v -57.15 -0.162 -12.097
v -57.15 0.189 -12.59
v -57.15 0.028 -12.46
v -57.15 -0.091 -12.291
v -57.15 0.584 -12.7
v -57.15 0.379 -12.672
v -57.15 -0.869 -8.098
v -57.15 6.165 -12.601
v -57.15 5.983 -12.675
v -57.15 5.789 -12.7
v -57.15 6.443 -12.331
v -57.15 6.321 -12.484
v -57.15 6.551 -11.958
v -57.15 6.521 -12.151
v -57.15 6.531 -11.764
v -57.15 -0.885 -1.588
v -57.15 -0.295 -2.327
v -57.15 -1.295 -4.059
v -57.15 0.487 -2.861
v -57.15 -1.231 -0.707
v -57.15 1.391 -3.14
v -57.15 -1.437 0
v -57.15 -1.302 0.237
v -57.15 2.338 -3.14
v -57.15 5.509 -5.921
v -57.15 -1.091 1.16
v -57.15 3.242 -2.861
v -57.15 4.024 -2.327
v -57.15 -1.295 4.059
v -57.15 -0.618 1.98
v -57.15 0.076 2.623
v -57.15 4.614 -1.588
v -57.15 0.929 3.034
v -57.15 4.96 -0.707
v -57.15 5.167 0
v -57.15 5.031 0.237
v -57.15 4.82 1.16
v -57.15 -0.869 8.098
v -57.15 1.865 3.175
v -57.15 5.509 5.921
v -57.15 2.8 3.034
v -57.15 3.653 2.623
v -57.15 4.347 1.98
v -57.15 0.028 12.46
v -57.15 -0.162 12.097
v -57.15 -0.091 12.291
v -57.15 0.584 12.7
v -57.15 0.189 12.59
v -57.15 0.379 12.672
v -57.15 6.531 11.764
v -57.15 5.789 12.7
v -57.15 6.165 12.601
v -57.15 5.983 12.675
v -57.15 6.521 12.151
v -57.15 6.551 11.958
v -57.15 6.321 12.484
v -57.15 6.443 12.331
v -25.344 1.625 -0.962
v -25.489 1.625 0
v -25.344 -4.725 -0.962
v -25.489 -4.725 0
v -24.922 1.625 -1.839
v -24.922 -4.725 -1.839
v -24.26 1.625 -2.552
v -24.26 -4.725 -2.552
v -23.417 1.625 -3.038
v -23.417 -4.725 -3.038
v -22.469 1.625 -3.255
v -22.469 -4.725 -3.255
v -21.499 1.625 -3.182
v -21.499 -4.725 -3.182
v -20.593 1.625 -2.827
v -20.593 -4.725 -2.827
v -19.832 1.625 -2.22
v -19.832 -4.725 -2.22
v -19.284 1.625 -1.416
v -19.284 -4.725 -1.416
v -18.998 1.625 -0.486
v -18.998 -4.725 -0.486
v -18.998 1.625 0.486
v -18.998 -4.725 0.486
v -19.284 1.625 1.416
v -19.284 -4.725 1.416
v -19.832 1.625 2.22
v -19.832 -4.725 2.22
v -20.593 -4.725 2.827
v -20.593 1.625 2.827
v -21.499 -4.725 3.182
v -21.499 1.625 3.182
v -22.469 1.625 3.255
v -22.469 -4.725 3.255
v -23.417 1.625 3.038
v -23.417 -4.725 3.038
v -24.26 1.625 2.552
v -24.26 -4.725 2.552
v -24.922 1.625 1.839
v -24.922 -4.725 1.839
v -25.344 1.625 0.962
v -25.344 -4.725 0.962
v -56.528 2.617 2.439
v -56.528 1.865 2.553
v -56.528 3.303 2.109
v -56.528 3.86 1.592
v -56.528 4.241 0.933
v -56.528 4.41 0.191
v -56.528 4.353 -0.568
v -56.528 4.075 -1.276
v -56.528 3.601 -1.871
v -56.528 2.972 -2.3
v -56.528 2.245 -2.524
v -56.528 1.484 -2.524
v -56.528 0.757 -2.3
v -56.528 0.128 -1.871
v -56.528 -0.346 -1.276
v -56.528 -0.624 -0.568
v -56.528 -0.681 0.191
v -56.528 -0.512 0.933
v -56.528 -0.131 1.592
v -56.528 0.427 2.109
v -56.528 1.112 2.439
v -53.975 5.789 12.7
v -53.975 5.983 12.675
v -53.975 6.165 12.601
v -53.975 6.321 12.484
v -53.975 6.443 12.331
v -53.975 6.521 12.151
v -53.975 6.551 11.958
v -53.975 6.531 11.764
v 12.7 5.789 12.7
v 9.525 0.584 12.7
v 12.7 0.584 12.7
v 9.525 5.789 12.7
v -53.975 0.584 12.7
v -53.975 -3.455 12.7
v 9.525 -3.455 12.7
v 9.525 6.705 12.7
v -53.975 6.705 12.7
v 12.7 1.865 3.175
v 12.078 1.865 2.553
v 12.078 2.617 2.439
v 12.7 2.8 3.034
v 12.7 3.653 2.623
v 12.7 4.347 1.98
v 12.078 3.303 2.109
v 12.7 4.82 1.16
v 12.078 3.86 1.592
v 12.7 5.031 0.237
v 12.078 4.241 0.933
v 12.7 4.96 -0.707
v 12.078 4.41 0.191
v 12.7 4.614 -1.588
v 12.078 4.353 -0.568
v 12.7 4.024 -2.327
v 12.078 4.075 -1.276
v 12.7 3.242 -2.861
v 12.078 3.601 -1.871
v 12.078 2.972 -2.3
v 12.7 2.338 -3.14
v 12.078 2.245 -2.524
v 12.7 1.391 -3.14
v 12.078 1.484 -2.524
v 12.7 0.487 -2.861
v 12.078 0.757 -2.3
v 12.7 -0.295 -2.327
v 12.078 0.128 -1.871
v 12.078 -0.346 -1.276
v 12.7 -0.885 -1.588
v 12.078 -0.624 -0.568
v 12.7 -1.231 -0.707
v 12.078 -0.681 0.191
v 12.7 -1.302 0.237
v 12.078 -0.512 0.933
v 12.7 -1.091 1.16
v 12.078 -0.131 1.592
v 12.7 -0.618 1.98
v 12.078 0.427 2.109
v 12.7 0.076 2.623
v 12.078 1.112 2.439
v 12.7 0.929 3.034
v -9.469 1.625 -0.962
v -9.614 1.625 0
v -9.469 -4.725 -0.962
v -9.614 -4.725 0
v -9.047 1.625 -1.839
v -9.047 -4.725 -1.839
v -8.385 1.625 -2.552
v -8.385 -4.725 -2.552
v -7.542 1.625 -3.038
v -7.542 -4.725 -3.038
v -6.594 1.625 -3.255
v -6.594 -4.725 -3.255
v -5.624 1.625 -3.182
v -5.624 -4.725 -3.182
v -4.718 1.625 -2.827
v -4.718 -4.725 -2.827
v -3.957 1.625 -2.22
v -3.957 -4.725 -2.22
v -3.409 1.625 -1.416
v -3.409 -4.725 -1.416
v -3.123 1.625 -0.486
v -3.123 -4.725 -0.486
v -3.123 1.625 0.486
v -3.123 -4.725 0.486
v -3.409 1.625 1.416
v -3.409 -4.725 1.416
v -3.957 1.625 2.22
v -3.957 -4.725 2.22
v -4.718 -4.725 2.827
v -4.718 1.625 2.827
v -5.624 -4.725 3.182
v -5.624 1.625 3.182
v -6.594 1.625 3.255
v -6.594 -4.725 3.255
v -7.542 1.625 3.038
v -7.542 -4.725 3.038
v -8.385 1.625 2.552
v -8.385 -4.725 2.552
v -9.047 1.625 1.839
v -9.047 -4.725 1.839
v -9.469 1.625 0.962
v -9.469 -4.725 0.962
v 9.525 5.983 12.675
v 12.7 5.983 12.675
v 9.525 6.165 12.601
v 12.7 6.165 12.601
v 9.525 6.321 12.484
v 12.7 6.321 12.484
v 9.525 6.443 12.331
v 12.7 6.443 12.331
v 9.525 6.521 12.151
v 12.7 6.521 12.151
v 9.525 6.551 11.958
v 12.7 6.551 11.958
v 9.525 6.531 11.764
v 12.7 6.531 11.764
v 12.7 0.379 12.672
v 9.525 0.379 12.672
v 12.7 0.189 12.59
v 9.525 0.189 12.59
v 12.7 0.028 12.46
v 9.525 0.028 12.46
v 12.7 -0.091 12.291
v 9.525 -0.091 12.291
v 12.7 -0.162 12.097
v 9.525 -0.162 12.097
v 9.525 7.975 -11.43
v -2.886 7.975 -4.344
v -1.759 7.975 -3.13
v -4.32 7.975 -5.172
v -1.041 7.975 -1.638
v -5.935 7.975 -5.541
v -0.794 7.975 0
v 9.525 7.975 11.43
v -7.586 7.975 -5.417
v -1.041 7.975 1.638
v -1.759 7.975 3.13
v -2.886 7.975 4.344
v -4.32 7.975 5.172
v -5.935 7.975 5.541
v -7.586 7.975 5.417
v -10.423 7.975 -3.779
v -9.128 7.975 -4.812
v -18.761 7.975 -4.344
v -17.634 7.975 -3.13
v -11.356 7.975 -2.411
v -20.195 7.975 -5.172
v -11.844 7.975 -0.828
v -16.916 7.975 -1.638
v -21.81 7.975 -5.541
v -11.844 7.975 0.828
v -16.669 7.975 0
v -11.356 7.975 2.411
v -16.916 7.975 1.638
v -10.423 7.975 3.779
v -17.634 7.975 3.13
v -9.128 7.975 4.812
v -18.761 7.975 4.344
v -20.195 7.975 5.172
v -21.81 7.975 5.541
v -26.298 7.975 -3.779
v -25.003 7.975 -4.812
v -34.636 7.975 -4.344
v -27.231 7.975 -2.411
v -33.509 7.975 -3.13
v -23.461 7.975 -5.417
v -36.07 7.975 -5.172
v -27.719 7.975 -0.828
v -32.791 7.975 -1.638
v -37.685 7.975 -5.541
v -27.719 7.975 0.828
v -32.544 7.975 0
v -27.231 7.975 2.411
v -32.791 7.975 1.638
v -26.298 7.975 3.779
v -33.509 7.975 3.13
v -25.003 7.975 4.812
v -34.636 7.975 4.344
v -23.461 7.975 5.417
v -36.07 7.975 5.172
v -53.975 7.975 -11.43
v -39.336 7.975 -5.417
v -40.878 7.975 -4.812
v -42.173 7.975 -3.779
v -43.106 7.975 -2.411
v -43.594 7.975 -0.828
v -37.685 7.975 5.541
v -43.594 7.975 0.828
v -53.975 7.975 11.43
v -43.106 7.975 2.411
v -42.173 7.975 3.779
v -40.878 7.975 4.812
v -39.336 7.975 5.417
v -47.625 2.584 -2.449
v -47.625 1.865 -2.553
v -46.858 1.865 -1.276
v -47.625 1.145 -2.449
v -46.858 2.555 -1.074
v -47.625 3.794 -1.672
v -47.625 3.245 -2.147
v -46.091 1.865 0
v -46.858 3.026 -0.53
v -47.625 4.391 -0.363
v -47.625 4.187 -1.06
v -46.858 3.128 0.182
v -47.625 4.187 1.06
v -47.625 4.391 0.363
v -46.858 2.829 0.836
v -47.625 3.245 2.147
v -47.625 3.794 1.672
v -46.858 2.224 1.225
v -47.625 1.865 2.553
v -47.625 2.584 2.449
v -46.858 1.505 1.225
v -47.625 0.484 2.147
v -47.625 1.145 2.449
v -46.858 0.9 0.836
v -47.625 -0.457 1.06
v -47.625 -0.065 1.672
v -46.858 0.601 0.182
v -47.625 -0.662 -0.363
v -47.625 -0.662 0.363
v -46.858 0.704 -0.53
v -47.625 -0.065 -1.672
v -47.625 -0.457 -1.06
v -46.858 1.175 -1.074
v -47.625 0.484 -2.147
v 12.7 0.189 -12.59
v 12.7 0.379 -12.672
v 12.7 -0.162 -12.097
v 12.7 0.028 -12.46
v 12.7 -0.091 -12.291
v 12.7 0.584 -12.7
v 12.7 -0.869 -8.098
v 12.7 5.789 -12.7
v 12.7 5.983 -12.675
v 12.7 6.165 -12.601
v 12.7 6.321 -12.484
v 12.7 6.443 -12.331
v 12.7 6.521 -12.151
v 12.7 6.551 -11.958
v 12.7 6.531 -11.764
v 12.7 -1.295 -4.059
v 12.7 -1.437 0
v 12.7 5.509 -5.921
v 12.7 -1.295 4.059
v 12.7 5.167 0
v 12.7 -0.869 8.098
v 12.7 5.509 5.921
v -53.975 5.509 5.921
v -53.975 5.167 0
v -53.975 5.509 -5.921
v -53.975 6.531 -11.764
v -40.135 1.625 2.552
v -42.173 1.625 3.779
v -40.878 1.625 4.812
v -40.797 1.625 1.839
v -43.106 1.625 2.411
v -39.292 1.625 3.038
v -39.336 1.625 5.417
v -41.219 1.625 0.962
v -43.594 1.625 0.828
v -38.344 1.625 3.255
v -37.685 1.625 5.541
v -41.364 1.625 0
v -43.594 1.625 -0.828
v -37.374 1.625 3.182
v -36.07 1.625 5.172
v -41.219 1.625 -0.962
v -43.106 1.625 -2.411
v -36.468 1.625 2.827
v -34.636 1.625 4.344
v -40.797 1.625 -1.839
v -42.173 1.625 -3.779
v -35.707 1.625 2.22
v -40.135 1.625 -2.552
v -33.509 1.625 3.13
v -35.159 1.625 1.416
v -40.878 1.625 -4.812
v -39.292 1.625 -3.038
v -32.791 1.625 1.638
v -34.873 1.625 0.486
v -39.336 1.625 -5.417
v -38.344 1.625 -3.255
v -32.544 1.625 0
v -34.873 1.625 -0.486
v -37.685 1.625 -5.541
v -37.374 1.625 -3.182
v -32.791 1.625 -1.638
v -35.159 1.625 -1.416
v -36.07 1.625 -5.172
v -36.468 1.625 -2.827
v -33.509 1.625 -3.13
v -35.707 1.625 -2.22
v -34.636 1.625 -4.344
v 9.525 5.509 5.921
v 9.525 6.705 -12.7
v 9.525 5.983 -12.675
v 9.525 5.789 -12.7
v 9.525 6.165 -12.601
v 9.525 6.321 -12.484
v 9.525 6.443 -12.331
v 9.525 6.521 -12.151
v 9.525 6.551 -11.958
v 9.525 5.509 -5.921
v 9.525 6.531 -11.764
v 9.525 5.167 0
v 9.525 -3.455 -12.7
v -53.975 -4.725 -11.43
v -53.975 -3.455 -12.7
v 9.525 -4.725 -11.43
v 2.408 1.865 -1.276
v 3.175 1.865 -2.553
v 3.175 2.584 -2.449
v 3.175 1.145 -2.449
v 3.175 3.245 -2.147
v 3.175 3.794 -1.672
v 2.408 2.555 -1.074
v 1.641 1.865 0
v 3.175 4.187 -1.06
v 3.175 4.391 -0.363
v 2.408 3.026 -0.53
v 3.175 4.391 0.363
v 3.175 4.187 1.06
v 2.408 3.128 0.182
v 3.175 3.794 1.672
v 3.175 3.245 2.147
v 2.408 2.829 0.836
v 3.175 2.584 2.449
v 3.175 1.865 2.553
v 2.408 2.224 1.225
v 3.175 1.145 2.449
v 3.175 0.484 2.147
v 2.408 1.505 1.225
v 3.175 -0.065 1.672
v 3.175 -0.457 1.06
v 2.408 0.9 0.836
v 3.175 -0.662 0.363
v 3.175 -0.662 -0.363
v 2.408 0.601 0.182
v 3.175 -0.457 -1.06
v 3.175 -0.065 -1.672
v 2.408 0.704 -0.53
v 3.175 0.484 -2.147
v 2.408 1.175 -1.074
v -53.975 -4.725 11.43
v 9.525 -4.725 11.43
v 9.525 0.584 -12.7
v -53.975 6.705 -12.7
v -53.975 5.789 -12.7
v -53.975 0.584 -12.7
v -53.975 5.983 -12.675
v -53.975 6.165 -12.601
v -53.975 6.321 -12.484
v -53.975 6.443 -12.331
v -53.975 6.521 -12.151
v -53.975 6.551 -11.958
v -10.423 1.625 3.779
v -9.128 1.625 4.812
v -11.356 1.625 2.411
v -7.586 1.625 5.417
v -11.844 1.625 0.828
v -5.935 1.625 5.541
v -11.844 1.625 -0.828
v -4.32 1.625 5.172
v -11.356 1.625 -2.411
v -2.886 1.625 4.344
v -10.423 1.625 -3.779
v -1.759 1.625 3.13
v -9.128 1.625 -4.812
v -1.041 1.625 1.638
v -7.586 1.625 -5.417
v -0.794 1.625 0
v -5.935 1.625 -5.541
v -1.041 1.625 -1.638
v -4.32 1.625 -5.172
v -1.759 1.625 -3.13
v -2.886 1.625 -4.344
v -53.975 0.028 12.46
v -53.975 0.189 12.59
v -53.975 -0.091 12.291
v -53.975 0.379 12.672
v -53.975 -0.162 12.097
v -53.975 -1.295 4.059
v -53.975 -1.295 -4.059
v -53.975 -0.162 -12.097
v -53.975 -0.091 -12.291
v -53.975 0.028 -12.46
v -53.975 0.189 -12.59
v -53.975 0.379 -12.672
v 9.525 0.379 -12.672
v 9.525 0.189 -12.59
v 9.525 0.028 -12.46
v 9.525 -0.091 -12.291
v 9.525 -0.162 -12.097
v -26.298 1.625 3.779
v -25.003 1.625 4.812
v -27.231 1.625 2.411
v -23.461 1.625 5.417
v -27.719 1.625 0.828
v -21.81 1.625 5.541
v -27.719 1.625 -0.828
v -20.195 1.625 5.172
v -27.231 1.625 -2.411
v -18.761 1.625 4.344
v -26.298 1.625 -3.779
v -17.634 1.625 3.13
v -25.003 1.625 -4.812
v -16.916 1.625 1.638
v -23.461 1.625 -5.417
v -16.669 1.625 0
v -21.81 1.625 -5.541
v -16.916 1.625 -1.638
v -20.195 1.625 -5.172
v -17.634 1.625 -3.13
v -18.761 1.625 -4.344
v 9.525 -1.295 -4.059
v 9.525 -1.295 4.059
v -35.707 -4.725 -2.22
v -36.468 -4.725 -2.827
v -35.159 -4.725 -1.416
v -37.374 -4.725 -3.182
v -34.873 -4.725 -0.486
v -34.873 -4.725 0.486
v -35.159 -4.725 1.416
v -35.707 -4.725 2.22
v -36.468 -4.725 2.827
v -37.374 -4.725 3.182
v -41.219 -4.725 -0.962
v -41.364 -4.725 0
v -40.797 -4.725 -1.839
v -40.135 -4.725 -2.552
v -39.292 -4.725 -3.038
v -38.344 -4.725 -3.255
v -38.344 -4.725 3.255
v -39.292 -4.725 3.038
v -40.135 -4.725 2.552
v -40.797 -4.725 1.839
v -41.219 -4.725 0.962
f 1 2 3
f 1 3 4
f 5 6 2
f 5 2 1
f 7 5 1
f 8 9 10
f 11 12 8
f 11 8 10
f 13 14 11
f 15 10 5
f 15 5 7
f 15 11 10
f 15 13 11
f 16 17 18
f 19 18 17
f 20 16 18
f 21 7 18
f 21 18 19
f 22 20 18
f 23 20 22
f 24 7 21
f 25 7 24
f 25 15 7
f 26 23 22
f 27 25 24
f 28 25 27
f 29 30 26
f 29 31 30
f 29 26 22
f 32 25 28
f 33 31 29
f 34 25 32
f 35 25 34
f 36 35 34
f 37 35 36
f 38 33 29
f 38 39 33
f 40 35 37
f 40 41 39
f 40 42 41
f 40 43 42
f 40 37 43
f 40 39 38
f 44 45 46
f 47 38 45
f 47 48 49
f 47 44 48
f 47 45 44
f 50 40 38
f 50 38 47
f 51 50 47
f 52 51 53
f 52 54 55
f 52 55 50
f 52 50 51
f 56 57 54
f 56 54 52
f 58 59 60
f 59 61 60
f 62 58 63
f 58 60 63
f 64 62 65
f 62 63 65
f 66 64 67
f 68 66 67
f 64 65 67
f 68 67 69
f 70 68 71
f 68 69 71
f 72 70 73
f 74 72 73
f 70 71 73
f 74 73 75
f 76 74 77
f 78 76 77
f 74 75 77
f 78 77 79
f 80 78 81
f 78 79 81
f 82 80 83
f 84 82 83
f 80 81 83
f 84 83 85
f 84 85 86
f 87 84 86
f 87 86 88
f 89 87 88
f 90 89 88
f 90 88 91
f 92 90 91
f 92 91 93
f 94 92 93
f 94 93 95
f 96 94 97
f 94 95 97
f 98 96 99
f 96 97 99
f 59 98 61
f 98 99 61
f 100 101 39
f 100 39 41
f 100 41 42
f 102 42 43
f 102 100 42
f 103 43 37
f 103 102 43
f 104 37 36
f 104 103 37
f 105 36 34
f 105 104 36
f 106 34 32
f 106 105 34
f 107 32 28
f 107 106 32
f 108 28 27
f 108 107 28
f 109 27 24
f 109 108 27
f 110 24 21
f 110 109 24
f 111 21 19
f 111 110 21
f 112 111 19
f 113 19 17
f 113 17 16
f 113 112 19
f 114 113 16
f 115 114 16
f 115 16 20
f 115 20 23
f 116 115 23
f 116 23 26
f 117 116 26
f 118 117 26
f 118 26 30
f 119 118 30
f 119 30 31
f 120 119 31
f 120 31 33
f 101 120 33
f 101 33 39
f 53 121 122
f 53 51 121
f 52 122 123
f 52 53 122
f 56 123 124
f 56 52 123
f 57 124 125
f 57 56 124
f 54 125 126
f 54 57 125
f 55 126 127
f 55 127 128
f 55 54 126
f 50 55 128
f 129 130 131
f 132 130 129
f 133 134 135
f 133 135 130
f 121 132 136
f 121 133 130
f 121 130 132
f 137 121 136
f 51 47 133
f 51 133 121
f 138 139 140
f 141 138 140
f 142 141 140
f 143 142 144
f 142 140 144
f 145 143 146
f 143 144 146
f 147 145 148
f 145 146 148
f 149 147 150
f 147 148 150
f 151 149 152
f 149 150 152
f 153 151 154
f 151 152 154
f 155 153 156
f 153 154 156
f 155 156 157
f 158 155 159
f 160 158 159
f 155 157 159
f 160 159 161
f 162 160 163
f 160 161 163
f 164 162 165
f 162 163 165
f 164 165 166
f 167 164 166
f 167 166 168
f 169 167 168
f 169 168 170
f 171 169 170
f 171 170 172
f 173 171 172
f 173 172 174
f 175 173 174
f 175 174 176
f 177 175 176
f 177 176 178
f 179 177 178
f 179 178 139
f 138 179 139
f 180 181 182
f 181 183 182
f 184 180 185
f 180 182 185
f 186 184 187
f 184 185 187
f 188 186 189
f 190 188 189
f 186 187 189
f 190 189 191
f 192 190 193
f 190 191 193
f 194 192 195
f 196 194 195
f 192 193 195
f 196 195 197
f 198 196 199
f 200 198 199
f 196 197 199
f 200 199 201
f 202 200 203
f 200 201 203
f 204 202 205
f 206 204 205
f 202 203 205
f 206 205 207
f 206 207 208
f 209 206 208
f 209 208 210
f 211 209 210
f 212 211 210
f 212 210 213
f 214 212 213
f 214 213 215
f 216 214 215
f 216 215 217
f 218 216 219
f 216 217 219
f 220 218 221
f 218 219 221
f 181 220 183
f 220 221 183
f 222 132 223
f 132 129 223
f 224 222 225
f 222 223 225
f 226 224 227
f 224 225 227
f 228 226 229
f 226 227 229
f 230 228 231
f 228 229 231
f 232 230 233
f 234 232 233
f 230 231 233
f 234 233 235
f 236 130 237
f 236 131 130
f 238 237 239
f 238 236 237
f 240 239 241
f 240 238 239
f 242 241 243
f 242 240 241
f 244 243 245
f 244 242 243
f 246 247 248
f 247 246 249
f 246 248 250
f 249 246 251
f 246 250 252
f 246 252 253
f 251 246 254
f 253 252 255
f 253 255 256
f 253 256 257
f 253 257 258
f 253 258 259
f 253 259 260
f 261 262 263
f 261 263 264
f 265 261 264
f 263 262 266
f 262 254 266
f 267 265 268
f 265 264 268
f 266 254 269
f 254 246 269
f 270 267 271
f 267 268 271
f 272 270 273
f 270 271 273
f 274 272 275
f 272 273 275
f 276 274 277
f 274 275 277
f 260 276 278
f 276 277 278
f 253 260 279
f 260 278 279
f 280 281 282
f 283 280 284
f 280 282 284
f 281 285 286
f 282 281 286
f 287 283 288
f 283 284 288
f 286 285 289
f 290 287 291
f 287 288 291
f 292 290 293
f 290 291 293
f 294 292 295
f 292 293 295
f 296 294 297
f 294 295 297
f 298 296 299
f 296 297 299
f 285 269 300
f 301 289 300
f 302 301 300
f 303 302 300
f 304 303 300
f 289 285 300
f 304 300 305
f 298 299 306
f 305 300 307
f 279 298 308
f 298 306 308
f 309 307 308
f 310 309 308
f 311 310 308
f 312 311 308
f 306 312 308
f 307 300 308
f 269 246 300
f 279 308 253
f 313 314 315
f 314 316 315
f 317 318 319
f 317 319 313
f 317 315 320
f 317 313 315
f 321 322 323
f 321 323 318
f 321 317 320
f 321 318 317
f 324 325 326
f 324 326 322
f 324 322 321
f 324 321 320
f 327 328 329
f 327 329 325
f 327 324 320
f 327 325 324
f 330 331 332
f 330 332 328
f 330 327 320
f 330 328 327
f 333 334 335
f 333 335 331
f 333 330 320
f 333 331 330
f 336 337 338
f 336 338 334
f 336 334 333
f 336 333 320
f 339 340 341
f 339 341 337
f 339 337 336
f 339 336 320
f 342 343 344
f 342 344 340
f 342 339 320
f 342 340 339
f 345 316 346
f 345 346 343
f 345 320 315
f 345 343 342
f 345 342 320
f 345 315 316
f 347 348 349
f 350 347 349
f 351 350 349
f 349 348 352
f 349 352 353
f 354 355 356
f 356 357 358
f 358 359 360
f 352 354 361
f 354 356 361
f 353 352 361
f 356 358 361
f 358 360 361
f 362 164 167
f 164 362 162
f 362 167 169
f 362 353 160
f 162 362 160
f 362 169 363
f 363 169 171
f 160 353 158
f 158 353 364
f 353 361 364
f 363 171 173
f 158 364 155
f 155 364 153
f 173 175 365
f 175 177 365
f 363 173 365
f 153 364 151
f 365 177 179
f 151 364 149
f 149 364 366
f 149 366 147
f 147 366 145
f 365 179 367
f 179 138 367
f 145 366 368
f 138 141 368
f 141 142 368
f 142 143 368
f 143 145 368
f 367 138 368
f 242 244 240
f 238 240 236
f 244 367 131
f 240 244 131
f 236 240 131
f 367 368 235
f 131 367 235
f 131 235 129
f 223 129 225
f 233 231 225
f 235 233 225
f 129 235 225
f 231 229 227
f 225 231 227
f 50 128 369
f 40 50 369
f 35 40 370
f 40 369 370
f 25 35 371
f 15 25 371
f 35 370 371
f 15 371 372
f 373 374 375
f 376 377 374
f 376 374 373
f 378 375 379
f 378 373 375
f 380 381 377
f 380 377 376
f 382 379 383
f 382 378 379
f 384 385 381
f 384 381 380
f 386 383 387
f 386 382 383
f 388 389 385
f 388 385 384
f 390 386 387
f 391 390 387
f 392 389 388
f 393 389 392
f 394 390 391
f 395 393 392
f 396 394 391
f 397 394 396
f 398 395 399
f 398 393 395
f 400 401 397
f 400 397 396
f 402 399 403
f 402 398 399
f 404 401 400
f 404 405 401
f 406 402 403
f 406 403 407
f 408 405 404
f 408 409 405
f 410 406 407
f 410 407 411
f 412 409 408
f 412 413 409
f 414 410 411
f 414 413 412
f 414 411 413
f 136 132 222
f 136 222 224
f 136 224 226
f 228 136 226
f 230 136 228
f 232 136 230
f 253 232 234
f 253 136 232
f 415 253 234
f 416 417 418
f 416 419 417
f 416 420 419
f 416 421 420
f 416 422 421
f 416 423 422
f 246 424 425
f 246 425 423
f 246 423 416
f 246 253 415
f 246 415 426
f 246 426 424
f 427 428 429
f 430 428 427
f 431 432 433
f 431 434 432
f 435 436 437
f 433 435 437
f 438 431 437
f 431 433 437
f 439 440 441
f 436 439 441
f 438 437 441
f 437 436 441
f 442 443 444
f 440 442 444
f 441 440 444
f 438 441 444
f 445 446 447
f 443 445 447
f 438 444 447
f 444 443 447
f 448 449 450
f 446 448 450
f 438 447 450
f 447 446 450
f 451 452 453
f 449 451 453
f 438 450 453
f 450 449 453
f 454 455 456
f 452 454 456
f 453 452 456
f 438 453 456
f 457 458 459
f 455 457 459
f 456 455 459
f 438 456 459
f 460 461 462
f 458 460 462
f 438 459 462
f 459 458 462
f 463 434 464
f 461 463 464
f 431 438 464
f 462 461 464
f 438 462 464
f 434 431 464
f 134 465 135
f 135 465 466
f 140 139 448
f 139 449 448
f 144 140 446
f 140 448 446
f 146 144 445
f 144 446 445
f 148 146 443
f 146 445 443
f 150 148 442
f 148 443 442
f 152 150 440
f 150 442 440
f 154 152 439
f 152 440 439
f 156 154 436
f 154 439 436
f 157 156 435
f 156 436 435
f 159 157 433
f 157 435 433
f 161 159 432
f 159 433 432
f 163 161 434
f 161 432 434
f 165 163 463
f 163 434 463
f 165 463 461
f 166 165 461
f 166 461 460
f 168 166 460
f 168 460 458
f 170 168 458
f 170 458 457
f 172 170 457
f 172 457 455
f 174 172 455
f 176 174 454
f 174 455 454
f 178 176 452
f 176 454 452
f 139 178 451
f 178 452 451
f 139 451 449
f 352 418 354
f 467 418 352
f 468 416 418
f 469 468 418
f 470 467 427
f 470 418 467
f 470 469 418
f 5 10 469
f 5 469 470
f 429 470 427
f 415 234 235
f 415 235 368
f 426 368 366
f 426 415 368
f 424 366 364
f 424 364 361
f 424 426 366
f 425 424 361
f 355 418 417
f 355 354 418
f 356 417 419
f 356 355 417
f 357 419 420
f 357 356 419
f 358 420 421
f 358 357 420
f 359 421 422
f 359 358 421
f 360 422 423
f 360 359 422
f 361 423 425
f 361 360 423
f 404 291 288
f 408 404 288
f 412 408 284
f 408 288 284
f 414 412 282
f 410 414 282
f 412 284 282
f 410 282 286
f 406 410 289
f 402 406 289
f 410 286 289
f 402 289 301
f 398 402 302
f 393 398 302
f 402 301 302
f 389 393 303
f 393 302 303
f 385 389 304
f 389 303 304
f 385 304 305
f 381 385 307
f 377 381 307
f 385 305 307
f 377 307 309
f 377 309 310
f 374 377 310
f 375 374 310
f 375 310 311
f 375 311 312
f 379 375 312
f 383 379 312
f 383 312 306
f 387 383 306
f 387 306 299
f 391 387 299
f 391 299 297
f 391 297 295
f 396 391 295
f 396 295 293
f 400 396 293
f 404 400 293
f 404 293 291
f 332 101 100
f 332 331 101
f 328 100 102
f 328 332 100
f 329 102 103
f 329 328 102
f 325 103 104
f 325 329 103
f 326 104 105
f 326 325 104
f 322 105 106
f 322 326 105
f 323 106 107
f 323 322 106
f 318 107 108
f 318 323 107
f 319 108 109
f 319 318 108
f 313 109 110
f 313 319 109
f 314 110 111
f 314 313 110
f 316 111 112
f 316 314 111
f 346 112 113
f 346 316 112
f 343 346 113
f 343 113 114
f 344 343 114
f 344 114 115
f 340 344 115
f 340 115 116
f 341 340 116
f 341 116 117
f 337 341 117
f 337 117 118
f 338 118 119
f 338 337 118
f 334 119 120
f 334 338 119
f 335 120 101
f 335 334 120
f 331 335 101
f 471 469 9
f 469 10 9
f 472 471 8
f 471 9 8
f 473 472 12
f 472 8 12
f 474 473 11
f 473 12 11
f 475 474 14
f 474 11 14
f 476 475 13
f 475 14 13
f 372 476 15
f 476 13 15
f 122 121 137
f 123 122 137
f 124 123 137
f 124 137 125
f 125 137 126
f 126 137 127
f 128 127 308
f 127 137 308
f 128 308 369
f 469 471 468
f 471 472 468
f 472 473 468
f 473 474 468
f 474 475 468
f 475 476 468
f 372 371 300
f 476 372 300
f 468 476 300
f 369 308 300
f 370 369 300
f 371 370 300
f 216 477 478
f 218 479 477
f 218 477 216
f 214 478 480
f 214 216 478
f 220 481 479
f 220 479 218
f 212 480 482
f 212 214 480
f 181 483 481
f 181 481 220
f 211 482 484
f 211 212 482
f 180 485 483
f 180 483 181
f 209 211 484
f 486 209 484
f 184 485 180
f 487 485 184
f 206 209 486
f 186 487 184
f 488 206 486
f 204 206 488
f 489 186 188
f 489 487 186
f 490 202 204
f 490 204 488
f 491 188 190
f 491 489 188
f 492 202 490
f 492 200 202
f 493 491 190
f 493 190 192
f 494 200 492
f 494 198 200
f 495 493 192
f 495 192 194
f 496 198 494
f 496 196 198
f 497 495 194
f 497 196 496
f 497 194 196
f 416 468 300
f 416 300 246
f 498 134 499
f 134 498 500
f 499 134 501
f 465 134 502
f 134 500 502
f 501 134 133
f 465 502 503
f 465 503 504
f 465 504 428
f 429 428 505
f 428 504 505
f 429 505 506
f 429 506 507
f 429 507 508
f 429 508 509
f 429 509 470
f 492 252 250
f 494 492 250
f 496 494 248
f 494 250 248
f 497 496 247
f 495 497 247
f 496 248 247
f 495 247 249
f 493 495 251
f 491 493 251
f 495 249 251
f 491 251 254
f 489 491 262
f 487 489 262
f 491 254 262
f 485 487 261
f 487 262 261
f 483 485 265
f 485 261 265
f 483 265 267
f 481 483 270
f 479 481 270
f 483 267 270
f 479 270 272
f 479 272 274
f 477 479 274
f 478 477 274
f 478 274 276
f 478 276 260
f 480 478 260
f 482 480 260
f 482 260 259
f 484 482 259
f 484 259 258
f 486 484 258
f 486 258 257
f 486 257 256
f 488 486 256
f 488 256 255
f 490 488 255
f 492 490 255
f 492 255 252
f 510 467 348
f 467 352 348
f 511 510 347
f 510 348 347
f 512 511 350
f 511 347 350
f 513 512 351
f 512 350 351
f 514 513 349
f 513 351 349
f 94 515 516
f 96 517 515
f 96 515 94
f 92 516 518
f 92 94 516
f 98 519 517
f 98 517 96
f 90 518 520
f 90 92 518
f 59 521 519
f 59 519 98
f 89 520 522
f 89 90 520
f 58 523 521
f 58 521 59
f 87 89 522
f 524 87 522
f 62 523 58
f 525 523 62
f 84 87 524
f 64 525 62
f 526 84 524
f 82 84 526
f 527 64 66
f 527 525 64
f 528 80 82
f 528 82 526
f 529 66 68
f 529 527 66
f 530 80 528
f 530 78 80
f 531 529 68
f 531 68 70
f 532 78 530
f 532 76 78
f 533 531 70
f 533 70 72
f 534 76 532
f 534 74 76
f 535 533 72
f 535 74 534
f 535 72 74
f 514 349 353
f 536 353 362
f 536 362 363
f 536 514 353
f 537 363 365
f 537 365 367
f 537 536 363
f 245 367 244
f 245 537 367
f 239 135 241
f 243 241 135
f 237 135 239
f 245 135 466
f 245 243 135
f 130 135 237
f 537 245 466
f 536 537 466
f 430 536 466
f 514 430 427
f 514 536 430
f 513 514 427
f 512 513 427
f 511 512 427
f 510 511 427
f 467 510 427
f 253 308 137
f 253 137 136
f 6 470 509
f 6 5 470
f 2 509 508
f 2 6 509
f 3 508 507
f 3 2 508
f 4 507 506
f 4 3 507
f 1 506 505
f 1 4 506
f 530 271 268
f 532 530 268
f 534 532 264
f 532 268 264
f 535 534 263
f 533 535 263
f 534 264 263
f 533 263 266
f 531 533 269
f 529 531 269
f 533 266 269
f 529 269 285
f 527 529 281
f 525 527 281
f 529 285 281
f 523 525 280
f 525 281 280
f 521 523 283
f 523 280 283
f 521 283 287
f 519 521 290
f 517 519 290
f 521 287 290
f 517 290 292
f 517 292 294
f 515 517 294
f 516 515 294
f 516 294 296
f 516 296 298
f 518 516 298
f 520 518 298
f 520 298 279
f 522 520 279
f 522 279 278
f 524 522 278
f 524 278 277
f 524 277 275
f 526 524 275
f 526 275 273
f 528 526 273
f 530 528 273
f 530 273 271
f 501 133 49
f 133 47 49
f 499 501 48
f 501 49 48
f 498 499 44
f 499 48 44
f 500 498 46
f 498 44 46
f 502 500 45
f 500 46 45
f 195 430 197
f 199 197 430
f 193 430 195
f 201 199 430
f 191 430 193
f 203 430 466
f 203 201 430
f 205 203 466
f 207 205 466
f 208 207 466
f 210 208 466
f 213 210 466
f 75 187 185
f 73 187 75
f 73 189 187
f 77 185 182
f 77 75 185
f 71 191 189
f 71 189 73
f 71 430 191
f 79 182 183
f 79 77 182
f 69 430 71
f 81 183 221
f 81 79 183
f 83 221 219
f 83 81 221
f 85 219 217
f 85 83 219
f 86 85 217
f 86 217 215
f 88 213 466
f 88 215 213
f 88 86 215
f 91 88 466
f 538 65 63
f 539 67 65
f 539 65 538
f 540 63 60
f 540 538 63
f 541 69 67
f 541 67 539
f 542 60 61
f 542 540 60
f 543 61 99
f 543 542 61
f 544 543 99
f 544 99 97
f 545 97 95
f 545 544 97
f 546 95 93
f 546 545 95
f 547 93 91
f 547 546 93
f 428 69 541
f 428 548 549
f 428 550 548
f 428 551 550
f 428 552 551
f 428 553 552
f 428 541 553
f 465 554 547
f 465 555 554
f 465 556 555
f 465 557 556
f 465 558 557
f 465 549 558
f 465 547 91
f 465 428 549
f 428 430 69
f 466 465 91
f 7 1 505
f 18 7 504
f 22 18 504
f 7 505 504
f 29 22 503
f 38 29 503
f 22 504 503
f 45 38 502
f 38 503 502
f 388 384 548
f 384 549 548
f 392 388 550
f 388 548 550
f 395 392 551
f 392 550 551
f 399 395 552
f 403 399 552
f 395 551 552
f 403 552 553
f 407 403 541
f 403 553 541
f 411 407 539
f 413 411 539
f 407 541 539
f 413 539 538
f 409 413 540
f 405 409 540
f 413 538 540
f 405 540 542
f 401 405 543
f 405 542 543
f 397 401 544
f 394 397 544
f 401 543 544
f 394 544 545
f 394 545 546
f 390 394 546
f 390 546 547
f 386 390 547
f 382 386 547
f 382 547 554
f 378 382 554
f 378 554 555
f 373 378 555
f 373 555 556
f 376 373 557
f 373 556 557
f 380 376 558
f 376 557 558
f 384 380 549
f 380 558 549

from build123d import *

# Parameters (mm, degrees)
SKETCH1_R                                        = 19.05
BOSS_EXTRUDE1_DEPTH                              = 12.7
CUT_EXTRUDE3_DEPTH                               = 30.784140075
SKETCH8_W                                        = 25.4
SKETCH8_H                                        = 4.850968343
CUT_EXTRUDE4_DEPTH                               = 30.784140075
SKETCH13_OUTSIDE_W                               = 49.628
SKETCH13_OUTSIDE_H                               = 37.157
SKETCH13_OUTSIDE_W_2                             = 25.4
SKETCH13_OUTSIDE_H_2                             = 25.629031657
CUT_EXTRUDE6_DEPTH                               = 27.940768363
SKETCH20_R                                       = 64.3382
CUT_EXTRUDE9_DEPTH                               = 3.175
BOSS_EXTRUDE4_DEPTH                              = 3.175
FILLET4_R                                        = 0.762
FILLET5_R                                        = 0.762
F_1_4_20_TAPPED_HOLE1_D                          = 5.1054
F_1_4_20_TAPPED_HOLE1_DEPTH                      = 9.525
F_1_4_20_TAPPED_HOLE1_CSINK_D                    = 6.35
F_1_4_20_TAPPED_HOLE1_CSINK_ANGLE                = 90
F_1_4_20_TAPPED_HOLE1_TIP                        = 1.533816902
SKETCH18_W                                       = 12.7
SKETCH18_H                                       = 9.525
BOSS_EXTRUDE3_DEPTH                              = 21.59
FILLET3_RADIUS                                   = 6.35
FILLET3_LENGTH                                   = 9.525
SKETCH19_R                                       = 3.175
CUT_EXTRUDE8_DEPTH                               = 42.79813026
SKETCH22_OUTSIDE_W                               = 38.286
SKETCH22_OUTSIDE_H                               = 59.325
SKETCH22_OUTSIDE_W_2                             = 25.4
SKETCH22_OUTSIDE_H_2                             = 19.685
CUT_EXTRUDE10_DEPTH                              = 41.042911819
BOSS_EXTRUDE5_DEPTH                              = 22.225
SKETCH26_OUTSIDE_W                               = 42.778
SKETCH26_OUTSIDE_H                               = 37.063
SKETCH26_OUTSIDE_W_2                             = 25.4
SKETCH26_OUTSIDE_H_2                             = 12.7
CUT_EXTRUDE11_DEPTH                              = 72.71846415
CHAMFER1_SIZE                                    = 1.27
CBORE_FOR_1_4_SOCKET_HEAD_CAP_SCREW1_D           = 6.5278
CBORE_FOR_1_4_SOCKET_HEAD_CAP_SCREW1_CBORE_D     = 11.1125
CBORE_FOR_1_4_SOCKET_HEAD_CAP_SCREW1_CBORE_DEPTH = 6.35


with BuildPart() as part:
    # Sketch1 → Boss-Extrude1 (new body)
    with BuildSketch(Plane(origin=(0, 0, 0), x_dir=(0, 0, -1), z_dir=(1, 0, 0))):
        Circle(SKETCH1_R)
    extrude(amount=BOSS_EXTRUDE1_DEPTH)

    # Sketch4 → Cut-Extrude3 (cut, through all)
    with BuildSketch(Plane(origin=(12.7, 0, 0), x_dir=(0, 0, -1), z_dir=(1, 0, 0))):
        with BuildLine():
            Line((-15.24, 21.59), (15.24, 21.59))
            Line((15.24, 21.59), (15.24, 11.43))
            ThreePointArc((15.24, 11.43), (0, 8.925760466), (-15.24, 11.43))
            Line((-15.24, 11.43), (-15.24, 21.59))
        make_face()
    extrude(amount=-CUT_EXTRUDE3_DEPTH, mode=Mode.SUBTRACT)

    # Sketch8 → Cut-Extrude4 (cut, through all)
    with BuildSketch(Plane.ZY):
        with Locations((0, -16.624515829)):
            Rectangle(SKETCH8_W, SKETCH8_H)
    extrude(amount=-CUT_EXTRUDE4_DEPTH, mode=Mode.SUBTRACT)

    # Sketch13 outside → Cut-Extrude6 (cut, through all)
    with BuildSketch(Plane(origin=(12.7, 0, 0), x_dir=(0, 0, -1), z_dir=(1, 0, 0))):
        with Locations((0, -1.3845)):
            Rectangle(SKETCH13_OUTSIDE_W, SKETCH13_OUTSIDE_H)
        with Locations((0, -1.384515828)):
            Rectangle(SKETCH13_OUTSIDE_W_2, SKETCH13_OUTSIDE_H_2, mode=Mode.SUBTRACT)
    extrude(amount=-CUT_EXTRUDE6_DEPTH, mode=Mode.SUBTRACT)

    # Sketch20 → Cut-Extrude9 (cut)
    with BuildSketch(Plane(origin=(12.7, 0, 0), x_dir=(0, 0, -1), z_dir=(1, 0, 0))):
        with Locations((0, 56.550760466)):
            Circle(SKETCH20_R)
    extrude(amount=-CUT_EXTRUDE9_DEPTH, mode=Mode.SUBTRACT)

    # Sketch21 → Boss-Extrude4 (add)
    with BuildSketch(Plane(origin=(9.525, 0, 0), x_dir=(0, 0, -1), z_dir=(1, 0, 0))):
        with BuildLine():
            Line((-12.7, -0.029636663), (-12.7, 6.760741289))
            ThreePointArc((-12.7, 6.760741289), (0, 5.166560466), (12.7, 6.760741289))
            Line((12.7, 6.760741289), (12.7, -0.029636663))
            ThreePointArc((12.7, -0.029636663), (0, -1.437439534), (-12.7, -0.029636663))
        make_face()
    extrude(amount=BOSS_EXTRUDE4_DEPTH)

    # Fillet4
    fillet4_edges = [part.edges().sort_by_distance(p)[0] for p in [
        (11.1125, -0.029636663, 12.7),
        (11.1125, -0.029636663, -12.7),
        (11.1125, 6.760741289, -12.7),
        (11.1125, 6.760741289, 12.7),
    ]]
    fillet(fillet4_edges, radius=FILLET4_R)

    # Fillet5
    fillet5_edges = [part.edges().sort_by_distance(p)[0] for p in [
        (11.1125, -6.521531226, 12.7),
        (11.1125, -6.521531226, -12.7),
    ]]
    fillet(fillet5_edges, radius=FILLET5_R)

    # 1/4-20 Tapped Hole1
    with Locations(Plane(origin=(12.7, 0, 0), x_dir=(0, 0, -1), z_dir=(1, 0, 0))):
        with Locations((0, 1.864560466)):
            CounterSinkHole(F_1_4_20_TAPPED_HOLE1_D / 2, F_1_4_20_TAPPED_HOLE1_CSINK_D / 2, depth=F_1_4_20_TAPPED_HOLE1_DEPTH, counter_sink_angle=F_1_4_20_TAPPED_HOLE1_CSINK_ANGLE)
            with Locations((0, 0, -(F_1_4_20_TAPPED_HOLE1_DEPTH + F_1_4_20_TAPPED_HOLE1_TIP / 2))):  # 118° drill point
                Cone(0, F_1_4_20_TAPPED_HOLE1_D / 2, F_1_4_20_TAPPED_HOLE1_TIP, mode=Mode.SUBTRACT)

    # Sketch18 → Boss-Extrude3 (add)
    with BuildSketch(Plane.XZ.offset(14.199031657)):
        with Locations((6.35, 0)):
            Rectangle(SKETCH18_W, SKETCH18_H)
    extrude(amount=BOSS_EXTRUDE3_DEPTH)

    # Fillet3: full round fillet: the end face becomes a half cylinder, R = half its width
    fillet3_face = Plane((6.35, -35.789031657, 0), x_dir=(0, 0, -1), z_dir=(0, -1, 0))  # on the end face: x along it, z out of the body
    fillet3_slab = fillet3_face.offset(-FILLET3_RADIUS / 2) * Box(FILLET3_LENGTH, 2 * FILLET3_RADIUS, FILLET3_RADIUS, mode=Mode.PRIVATE)  # the body's end, R deep
    fillet3_round = Plane((6.35, -29.439031657, 0), x_dir=(0, -1, 0), z_dir=(0, 0, -1)) * Cylinder(FILLET3_RADIUS, FILLET3_LENGTH, mode=Mode.PRIVATE)  # its axis R under the face
    add(fillet3_slab - fillet3_round, mode=Mode.SUBTRACT)

    # Sketch19 → Cut-Extrude8 (cut, through all)
    with BuildSketch(Plane.XY.offset(4.7625)):
        with Locations((6.35, -29.439031657)):
            Circle(SKETCH19_R)
    extrude(amount=-CUT_EXTRUDE8_DEPTH, mode=Mode.SUBTRACT)

    # Sketch22 outside → Cut-Extrude10 (cut, through all)
    with BuildSketch(Plane(origin=(12.7, 0, 0), x_dir=(0, 0, -1), z_dir=(1, 0, 0))):
        with Locations((0, -12.5695)):
            Rectangle(SKETCH22_OUTSIDE_W, SKETCH22_OUTSIDE_H)
        with Locations((0, 0.3175)):
            Rectangle(SKETCH22_OUTSIDE_W_2, SKETCH22_OUTSIDE_H_2, mode=Mode.SUBTRACT)
    extrude(amount=-CUT_EXTRUDE10_DEPTH, mode=Mode.SUBTRACT)

    # Sketch23 → Boss-Extrude5 (add)
    with BuildSketch(Plane.ZY):
        with BuildLine():
            Line((-10.77209211, 10.16), (-12.7, 10.16))
            Line((-12.7, 10.16), (-12.7, -9.525))
            Line((-12.7, -9.525), (12.7, -9.525))
            Line((12.7, -9.525), (12.7, 10.16))
            Line((12.7, 10.16), (10.77209211, 10.16))
            ThreePointArc((10.77209211, 10.16), (0, 8.925760466), (-10.77209211, 10.16))
        make_face()
    extrude(amount=BOSS_EXTRUDE5_DEPTH)

    # Mirror1: part across plane


with BuildPart() as part_1:
    add(part.part)
    add(part.part.mirror(Plane(origin=(-22.225, 56.550760466, 0), x_dir=(0, 0, 1), z_dir=(-1, 0, 0))))

    # Sketch26 outside → Cut-Extrude11 (cut, through all)
    with BuildSketch(Plane.ZY.offset(57.15)):
        with Locations((0, 0.3175)):
            Rectangle(SKETCH26_OUTSIDE_W, SKETCH26_OUTSIDE_H)
        with Locations((0, 1.624726526)):
            Rectangle(SKETCH26_OUTSIDE_W_2, SKETCH26_OUTSIDE_H_2, mode=Mode.SUBTRACT)
    extrude(amount=-CUT_EXTRUDE11_DEPTH, mode=Mode.SUBTRACT)

    # Chamfer1
    chamfer1_edges = [part_1.edges().sort_by_distance(p)[0] for p in [
        (-22.225, 7.974726526, -12.7),
        (-22.225, 7.974726526, 12.7),
        (-22.225, -4.725273474, 12.7),
        (-22.225, -4.725273474, -12.7),
    ]]
    chamfer(chamfer1_edges, length=CHAMFER1_SIZE)

    # CBORE for 1/4 Socket Head Cap Screw1 (through all)
    with Locations(Plane(origin=(0, 7.974726526, 0), x_dir=(1, 0, 0), z_dir=(0, 1, 0))):
        with Locations((-22.225, 0), (-38.1, 0), (-6.35, 0)):
            CounterBoreHole(CBORE_FOR_1_4_SOCKET_HEAD_CAP_SCREW1_D / 2, CBORE_FOR_1_4_SOCKET_HEAD_CAP_SCREW1_CBORE_D / 2, CBORE_FOR_1_4_SOCKET_HEAD_CAP_SCREW1_CBORE_DEPTH)


solid = part_1.part
